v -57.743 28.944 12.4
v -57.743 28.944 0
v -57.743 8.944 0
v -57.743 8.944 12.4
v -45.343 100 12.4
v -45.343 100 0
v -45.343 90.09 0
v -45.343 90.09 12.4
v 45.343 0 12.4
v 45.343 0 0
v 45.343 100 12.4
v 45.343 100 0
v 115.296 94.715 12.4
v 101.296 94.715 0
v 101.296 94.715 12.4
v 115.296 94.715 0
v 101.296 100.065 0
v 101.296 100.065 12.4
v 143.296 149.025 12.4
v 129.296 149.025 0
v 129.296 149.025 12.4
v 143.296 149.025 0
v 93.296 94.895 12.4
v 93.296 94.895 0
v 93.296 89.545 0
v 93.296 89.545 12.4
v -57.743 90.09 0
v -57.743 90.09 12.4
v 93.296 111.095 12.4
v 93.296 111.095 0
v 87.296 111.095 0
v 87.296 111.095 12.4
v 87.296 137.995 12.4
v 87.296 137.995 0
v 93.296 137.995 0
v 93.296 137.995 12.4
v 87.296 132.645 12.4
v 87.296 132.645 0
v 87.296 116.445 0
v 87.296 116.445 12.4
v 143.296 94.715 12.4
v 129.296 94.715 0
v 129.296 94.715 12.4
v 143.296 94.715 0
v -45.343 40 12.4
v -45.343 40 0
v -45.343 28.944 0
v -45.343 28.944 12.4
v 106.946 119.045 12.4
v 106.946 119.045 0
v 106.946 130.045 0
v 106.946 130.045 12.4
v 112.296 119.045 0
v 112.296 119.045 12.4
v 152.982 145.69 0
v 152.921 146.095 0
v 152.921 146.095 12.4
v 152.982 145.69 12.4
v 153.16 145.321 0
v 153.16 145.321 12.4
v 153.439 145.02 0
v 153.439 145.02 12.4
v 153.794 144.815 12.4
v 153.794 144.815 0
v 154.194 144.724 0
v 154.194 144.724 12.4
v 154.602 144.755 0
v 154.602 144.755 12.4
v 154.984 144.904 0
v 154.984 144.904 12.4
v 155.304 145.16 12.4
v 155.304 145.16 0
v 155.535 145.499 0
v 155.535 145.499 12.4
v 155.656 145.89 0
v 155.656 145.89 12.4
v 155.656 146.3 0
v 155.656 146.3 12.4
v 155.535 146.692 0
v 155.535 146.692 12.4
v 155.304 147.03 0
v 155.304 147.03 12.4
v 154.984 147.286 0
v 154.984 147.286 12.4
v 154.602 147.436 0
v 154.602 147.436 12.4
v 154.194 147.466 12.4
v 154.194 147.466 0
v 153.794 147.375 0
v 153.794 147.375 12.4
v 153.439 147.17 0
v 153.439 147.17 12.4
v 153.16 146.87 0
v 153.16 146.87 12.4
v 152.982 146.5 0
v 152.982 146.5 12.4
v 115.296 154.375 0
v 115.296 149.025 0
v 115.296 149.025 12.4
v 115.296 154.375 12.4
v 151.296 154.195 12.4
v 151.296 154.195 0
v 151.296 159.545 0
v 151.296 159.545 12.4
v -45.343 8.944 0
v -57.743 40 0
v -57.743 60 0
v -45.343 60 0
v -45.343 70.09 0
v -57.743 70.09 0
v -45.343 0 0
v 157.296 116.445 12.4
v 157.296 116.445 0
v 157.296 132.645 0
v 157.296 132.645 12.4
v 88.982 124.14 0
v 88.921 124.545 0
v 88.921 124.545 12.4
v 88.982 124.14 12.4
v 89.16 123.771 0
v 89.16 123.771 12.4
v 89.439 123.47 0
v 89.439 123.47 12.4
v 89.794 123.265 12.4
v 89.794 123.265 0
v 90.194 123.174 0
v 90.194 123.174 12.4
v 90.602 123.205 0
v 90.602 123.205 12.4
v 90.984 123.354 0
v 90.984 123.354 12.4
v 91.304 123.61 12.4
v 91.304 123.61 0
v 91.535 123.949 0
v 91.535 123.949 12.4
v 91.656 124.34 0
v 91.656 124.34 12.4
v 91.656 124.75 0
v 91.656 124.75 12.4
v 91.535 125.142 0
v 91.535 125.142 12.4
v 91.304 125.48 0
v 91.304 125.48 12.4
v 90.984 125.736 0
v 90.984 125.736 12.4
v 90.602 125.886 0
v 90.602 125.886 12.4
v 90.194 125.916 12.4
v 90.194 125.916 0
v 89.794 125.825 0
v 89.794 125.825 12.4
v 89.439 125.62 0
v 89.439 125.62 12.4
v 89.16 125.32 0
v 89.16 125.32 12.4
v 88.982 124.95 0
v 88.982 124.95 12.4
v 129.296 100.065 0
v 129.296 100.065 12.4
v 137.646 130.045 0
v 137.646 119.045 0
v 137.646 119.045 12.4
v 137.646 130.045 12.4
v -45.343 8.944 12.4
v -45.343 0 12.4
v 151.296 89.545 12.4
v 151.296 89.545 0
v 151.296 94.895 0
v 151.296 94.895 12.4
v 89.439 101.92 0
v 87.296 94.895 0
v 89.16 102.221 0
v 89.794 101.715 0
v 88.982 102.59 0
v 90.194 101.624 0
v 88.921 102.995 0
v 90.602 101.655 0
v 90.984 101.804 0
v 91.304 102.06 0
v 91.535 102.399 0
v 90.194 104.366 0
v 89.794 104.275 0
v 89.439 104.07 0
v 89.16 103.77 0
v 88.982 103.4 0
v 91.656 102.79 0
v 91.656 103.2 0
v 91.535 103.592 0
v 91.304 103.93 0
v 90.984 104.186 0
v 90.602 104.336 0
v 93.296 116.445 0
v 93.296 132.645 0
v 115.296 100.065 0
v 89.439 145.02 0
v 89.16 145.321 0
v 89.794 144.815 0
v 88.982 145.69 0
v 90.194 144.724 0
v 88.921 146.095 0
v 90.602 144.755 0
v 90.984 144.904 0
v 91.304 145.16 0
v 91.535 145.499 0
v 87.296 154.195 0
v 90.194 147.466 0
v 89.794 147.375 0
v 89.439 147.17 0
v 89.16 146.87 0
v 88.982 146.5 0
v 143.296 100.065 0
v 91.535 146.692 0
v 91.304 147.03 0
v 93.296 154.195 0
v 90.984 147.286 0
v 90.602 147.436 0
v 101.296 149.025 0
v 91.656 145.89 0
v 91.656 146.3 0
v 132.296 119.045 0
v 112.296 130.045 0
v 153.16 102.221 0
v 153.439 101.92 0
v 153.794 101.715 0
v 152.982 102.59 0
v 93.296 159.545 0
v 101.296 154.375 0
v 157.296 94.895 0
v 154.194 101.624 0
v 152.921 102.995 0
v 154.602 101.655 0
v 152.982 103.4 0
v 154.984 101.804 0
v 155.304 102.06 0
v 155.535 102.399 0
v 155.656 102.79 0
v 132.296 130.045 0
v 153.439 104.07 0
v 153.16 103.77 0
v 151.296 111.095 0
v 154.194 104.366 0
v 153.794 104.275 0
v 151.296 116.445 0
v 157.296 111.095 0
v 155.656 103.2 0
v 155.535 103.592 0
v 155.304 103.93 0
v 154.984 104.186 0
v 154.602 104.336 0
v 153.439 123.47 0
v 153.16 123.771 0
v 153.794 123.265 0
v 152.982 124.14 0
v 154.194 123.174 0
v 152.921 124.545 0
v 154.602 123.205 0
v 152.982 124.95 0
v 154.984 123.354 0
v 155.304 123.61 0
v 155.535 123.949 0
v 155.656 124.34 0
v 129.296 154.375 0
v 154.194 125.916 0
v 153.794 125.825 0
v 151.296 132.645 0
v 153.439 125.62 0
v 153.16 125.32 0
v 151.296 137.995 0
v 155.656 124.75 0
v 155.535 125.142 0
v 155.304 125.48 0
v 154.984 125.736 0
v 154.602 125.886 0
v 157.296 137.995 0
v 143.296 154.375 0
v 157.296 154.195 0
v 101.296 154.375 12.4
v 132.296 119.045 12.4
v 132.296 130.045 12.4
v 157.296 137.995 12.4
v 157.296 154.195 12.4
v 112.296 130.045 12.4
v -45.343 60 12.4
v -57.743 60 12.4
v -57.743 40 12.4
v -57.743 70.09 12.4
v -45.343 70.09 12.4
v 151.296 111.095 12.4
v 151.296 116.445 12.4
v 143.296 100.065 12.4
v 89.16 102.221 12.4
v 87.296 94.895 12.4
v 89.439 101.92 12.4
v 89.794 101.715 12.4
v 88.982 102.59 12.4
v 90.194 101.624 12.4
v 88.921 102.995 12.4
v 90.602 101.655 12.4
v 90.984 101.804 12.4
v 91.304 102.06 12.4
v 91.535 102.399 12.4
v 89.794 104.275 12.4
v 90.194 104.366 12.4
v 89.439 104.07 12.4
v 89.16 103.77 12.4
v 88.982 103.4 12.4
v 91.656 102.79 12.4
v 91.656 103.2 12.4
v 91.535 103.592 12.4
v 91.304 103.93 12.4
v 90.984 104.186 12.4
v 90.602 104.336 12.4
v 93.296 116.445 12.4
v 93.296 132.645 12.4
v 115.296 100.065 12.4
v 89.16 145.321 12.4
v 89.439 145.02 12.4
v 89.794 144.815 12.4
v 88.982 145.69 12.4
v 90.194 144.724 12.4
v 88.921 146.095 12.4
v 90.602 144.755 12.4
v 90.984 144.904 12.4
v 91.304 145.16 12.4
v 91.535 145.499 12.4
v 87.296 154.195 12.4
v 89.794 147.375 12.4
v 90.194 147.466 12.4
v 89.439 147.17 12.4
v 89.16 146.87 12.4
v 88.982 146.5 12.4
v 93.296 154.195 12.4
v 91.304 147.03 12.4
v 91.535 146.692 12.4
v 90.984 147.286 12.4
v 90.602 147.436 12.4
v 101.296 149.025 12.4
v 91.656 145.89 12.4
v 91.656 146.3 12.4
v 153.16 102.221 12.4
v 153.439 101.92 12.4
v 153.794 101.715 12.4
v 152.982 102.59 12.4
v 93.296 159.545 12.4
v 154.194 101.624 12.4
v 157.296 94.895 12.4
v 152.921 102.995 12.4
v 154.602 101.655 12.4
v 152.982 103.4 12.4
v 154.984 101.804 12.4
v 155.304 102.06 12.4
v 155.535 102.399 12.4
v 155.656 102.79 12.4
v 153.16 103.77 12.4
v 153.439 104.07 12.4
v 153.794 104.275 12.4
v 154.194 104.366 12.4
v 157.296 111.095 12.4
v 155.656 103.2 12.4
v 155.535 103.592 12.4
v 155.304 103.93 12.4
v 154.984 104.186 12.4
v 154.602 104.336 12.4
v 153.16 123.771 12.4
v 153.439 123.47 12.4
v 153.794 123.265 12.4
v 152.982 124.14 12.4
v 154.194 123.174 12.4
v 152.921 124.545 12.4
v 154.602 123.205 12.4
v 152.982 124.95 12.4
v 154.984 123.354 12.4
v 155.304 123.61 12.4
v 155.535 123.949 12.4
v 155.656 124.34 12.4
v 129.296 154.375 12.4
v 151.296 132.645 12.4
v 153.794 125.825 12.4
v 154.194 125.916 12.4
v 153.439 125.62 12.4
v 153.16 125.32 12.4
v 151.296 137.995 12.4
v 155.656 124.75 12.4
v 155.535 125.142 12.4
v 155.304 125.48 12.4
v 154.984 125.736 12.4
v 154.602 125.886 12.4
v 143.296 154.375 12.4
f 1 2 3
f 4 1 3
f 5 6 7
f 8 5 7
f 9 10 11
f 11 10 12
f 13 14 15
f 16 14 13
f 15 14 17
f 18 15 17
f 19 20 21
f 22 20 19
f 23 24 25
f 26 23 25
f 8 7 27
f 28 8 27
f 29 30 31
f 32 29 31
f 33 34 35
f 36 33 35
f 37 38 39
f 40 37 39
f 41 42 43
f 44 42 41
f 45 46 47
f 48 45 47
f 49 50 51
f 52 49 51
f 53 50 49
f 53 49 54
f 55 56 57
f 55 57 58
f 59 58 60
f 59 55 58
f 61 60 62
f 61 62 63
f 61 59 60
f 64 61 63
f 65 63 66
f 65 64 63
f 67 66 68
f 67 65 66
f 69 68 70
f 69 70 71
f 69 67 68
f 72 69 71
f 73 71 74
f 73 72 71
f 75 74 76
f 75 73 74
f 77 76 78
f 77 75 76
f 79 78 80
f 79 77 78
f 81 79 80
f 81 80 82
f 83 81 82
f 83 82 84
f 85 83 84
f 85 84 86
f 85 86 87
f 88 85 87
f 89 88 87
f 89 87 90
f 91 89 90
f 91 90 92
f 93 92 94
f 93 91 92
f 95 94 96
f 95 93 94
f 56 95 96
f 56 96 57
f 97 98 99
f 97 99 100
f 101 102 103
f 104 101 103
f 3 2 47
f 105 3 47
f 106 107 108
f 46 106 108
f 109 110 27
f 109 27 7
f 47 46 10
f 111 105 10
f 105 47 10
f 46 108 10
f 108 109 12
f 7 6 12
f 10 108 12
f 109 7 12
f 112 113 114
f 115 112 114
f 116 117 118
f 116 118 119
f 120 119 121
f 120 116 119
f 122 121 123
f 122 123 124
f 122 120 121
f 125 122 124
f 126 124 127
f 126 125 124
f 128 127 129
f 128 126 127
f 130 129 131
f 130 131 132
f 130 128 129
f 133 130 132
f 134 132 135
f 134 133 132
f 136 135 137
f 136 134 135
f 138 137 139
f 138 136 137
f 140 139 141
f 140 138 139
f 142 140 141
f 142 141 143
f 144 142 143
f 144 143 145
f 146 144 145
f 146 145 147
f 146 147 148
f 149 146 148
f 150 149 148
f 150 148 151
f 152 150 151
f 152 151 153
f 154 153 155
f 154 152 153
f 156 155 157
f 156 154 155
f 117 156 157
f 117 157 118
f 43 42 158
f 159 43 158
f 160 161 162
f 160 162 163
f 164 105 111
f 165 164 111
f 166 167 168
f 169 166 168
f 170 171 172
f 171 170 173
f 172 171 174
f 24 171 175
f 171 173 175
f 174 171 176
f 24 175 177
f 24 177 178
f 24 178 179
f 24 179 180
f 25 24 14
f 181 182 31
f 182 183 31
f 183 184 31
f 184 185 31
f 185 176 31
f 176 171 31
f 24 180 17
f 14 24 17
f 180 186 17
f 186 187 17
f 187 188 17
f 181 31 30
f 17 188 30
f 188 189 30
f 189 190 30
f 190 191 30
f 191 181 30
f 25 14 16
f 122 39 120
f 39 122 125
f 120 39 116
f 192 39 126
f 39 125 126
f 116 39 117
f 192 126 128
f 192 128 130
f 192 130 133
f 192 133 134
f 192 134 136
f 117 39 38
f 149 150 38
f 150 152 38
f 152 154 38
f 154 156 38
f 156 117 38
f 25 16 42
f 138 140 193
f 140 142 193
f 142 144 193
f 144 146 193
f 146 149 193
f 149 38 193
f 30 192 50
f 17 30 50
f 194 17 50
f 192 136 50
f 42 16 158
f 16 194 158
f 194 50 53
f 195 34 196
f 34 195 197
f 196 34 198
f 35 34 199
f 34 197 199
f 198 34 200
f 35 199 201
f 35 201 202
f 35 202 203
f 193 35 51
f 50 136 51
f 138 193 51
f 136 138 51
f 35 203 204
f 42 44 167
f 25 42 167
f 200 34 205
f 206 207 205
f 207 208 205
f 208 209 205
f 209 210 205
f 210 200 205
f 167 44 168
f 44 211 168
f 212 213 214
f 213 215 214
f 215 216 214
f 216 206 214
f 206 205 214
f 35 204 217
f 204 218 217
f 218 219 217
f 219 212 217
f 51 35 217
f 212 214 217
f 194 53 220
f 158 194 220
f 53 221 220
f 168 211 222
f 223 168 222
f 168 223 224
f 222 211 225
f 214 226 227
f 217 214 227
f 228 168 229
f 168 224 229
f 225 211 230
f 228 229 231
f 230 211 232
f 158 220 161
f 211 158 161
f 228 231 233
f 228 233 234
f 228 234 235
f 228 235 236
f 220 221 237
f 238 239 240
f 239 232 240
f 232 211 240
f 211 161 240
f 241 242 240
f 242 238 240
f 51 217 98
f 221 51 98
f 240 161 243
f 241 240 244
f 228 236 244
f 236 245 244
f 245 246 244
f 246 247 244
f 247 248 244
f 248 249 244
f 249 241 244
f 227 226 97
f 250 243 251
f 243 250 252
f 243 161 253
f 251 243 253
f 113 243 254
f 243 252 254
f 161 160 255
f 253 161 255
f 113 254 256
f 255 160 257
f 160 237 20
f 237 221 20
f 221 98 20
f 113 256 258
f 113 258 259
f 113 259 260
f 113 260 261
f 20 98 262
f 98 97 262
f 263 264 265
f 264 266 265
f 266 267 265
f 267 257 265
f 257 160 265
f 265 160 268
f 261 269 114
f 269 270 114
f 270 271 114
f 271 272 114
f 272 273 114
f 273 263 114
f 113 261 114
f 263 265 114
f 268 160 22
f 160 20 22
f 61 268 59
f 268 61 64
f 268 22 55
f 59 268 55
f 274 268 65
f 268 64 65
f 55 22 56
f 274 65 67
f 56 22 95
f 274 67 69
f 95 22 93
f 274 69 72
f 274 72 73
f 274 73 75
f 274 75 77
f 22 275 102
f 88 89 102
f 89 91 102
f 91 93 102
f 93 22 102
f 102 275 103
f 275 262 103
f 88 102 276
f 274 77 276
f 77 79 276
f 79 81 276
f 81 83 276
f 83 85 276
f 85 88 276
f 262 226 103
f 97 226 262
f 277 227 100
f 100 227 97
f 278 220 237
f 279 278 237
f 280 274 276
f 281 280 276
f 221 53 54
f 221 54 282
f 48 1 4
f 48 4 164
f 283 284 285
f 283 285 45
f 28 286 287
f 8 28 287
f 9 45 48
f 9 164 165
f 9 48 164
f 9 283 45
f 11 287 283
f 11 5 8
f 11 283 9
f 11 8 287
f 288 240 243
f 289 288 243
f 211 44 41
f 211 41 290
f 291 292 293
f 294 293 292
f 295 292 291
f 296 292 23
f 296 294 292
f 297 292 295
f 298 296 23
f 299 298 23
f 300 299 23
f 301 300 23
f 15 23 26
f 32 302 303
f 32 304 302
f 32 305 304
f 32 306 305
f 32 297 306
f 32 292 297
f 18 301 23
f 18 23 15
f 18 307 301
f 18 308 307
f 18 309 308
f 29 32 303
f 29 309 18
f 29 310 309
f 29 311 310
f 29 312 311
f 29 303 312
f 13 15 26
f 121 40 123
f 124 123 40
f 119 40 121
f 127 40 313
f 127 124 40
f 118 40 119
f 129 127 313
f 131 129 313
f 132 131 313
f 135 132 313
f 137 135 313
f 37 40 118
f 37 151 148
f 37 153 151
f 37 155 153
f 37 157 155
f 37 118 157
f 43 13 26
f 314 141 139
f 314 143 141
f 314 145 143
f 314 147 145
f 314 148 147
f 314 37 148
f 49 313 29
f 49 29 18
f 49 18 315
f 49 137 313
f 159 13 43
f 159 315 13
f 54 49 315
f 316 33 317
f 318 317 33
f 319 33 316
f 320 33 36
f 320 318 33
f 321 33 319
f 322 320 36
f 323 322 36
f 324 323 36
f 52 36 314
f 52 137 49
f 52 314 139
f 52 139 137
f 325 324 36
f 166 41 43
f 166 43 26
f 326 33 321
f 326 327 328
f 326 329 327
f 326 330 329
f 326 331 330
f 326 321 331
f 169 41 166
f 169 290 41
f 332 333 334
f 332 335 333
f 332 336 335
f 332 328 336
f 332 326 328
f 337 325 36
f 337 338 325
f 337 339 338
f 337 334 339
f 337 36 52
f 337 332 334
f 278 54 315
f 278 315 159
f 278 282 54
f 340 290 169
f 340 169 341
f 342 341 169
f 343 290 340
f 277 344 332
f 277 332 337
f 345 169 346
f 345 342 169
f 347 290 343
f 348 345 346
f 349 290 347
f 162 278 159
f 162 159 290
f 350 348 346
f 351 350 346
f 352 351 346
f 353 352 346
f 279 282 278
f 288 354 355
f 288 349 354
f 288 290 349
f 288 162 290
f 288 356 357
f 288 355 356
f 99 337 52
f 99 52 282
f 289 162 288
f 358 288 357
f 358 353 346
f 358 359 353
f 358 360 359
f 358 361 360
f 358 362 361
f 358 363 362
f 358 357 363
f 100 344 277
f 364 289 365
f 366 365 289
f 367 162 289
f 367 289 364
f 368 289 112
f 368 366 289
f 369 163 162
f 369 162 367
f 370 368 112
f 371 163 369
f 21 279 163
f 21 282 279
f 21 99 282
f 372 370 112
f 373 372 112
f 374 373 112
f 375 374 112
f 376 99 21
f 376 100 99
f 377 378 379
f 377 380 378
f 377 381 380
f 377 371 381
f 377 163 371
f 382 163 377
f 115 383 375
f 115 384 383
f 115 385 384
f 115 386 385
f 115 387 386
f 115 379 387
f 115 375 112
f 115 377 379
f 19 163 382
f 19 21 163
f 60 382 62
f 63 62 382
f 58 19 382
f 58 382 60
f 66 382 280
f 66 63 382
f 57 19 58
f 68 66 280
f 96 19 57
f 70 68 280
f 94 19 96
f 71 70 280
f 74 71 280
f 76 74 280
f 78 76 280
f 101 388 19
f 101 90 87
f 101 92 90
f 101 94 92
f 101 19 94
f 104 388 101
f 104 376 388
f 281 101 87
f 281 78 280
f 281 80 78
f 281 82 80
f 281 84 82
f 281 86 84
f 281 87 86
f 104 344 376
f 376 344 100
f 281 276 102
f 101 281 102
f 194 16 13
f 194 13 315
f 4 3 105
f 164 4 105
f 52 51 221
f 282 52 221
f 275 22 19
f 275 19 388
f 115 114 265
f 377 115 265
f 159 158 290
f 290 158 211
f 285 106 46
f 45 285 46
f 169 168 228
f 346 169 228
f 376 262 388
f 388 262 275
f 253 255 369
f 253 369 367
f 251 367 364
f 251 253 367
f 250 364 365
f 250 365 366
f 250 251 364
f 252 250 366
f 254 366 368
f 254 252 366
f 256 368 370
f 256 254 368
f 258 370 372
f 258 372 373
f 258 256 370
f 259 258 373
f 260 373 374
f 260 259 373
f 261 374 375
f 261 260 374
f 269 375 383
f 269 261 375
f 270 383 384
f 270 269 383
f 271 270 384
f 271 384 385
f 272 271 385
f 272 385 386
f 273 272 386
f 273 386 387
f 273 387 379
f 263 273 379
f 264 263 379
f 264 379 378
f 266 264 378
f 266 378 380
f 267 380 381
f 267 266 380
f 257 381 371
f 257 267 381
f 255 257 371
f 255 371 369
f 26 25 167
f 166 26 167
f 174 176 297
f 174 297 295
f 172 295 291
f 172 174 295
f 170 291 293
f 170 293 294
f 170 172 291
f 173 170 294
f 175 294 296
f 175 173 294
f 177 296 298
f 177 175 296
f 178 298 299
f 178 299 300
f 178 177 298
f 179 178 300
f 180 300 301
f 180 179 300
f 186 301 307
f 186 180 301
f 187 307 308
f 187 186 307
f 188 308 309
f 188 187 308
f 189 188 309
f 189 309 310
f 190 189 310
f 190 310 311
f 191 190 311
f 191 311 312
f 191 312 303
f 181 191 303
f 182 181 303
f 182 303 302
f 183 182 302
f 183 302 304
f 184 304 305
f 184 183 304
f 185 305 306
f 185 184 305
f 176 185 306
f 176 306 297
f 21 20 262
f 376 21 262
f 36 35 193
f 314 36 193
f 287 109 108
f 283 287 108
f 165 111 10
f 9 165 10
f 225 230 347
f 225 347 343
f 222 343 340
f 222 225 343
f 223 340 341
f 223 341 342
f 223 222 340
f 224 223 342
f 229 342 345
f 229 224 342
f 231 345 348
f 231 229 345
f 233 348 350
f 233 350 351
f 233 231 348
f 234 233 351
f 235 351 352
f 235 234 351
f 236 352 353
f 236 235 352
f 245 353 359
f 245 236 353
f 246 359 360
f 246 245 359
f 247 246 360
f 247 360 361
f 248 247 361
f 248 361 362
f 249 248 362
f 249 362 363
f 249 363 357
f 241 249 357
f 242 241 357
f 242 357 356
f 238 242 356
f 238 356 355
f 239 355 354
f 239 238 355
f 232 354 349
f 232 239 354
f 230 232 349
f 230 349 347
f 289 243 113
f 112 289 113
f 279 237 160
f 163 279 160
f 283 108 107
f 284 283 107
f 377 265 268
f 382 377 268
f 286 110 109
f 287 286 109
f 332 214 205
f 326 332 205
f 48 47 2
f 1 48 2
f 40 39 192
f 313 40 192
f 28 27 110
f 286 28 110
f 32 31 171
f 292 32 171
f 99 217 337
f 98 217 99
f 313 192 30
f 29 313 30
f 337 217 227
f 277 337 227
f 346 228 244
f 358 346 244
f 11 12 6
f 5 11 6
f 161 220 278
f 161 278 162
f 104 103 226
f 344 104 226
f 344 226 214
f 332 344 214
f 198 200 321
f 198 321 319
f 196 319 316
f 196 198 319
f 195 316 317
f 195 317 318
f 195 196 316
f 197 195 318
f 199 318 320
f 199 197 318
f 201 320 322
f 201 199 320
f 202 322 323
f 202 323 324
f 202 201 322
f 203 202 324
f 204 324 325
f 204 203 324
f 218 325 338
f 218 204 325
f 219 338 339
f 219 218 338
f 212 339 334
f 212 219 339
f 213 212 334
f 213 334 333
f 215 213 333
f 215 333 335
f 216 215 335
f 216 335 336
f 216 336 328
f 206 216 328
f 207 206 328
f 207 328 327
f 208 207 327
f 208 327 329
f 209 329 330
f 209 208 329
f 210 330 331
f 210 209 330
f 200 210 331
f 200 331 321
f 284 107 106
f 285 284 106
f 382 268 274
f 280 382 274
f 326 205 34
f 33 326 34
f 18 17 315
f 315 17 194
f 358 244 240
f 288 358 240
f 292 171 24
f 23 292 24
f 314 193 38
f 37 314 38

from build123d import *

# Parameters (mm, degrees)
MODEL_R               = 1.375
MODEL_W               = 14
MODEL_H               = 5.35
MODEL_W_2             = 5.35
MODEL_H_2             = 11
BOSS_EXTRUDE1_DEPTH   = 12.4
BOSS_EXTRUDE1_2_DEPTH = 12.4


with BuildPart() as part:
    # Model → Boss-Extrude1 (new body)
    with BuildSketch(Plane.XY):
        Polygon((93.296383478, 89.545101684), (151.296383478, 89.545101684), (151.296383478, 94.895101684), (157.296383478, 94.895101684), (157.296383478, 111.095101684), (151.296383478, 111.095101684), (151.296383478, 116.445101684), (157.296383478, 116.445101684), (157.296383478, 132.645101684), (151.296383478, 132.645101684), (151.296383478, 137.995101684), (157.296383478, 137.995101684), (157.296383478, 154.195101684), (151.296383478, 154.195101684), (151.296383478, 159.545101684), (93.296383478, 159.545101684), (93.296383478, 154.195101684), (87.296383478, 154.195101684), (87.296383478, 137.995101684), (93.296383478, 137.995101684), (93.296383478, 132.645101684), (87.296383478, 132.645101684), (87.296383478, 116.445101684), (93.296383478, 116.445101684), (93.296383478, 111.095101684), (87.296383478, 111.095101684), (87.296383478, 94.895101684), (93.296383478, 94.895101684), align=None)
        with Locations(Location((90.296383478, 146.095101684, 0), (0, 0, 180))):
            Circle(MODEL_R, mode=Mode.SUBTRACT)
        with Locations(Location((154.296383478, 146.095101684, 0), (0, 0, 180))):
            Circle(MODEL_R, mode=Mode.SUBTRACT)
        with Locations(Location((154.296383478, 102.995101684, 0), (0, 0, 180))):
            Circle(MODEL_R, mode=Mode.SUBTRACT)
        with Locations(Location((90.296383478, 102.995101684, 0), (0, 0, 180))):
            Circle(MODEL_R, mode=Mode.SUBTRACT)
        with Locations(Location((90.296383478, 124.545101684, 0), (0, 0, 180))):
            Circle(MODEL_R, mode=Mode.SUBTRACT)
        with Locations(Location((154.296383478, 124.545101684, 0), (0, 0, 180))):
            Circle(MODEL_R, mode=Mode.SUBTRACT)
        with Locations((108.296383478, 151.700101684)):
            Rectangle(MODEL_W, MODEL_H, mode=Mode.SUBTRACT)
        with Locations((136.296383478, 151.700101684)):
            Rectangle(MODEL_W, MODEL_H, mode=Mode.SUBTRACT)
        with Locations((136.296383478, 97.390101684)):
            Rectangle(MODEL_W, MODEL_H, mode=Mode.SUBTRACT)
        with Locations((108.296383478, 97.390101684)):
            Rectangle(MODEL_W, MODEL_H, mode=Mode.SUBTRACT)
        with Locations((109.621383478, 124.545101684)):
            Rectangle(MODEL_W_2, MODEL_H_2, mode=Mode.SUBTRACT)
        with Locations((134.971383478, 124.545101684)):
            Rectangle(MODEL_W_2, MODEL_H_2, mode=Mode.SUBTRACT)
    extrude(amount=BOSS_EXTRUDE1_DEPTH)


with BuildPart() as body_2:
    # Model → Boss-Extrude1 2 (new body)
    with BuildSketch(Plane.XY):
        Polygon((-45.343128598, 90.090149077), (-57.743128598, 90.090149077), (-57.743128598, 70.090149077), (-45.343128598, 70.090149077), (-45.343128598, 60), (-57.743128598, 60), (-57.743128598, 40), (-45.343128598, 40), (-45.343128598, 28.943501612), (-57.743128598, 28.943501612), (-57.743128598, 8.943501612), (-45.343128598, 8.943501612), (-45.343128598, 0), (45.343128598, 0), (45.343128598, 100), (-45.343128598, 100), align=None)
    extrude(amount=BOSS_EXTRUDE1_2_DEPTH)


solid = Compound([part.part, body_2.part])
